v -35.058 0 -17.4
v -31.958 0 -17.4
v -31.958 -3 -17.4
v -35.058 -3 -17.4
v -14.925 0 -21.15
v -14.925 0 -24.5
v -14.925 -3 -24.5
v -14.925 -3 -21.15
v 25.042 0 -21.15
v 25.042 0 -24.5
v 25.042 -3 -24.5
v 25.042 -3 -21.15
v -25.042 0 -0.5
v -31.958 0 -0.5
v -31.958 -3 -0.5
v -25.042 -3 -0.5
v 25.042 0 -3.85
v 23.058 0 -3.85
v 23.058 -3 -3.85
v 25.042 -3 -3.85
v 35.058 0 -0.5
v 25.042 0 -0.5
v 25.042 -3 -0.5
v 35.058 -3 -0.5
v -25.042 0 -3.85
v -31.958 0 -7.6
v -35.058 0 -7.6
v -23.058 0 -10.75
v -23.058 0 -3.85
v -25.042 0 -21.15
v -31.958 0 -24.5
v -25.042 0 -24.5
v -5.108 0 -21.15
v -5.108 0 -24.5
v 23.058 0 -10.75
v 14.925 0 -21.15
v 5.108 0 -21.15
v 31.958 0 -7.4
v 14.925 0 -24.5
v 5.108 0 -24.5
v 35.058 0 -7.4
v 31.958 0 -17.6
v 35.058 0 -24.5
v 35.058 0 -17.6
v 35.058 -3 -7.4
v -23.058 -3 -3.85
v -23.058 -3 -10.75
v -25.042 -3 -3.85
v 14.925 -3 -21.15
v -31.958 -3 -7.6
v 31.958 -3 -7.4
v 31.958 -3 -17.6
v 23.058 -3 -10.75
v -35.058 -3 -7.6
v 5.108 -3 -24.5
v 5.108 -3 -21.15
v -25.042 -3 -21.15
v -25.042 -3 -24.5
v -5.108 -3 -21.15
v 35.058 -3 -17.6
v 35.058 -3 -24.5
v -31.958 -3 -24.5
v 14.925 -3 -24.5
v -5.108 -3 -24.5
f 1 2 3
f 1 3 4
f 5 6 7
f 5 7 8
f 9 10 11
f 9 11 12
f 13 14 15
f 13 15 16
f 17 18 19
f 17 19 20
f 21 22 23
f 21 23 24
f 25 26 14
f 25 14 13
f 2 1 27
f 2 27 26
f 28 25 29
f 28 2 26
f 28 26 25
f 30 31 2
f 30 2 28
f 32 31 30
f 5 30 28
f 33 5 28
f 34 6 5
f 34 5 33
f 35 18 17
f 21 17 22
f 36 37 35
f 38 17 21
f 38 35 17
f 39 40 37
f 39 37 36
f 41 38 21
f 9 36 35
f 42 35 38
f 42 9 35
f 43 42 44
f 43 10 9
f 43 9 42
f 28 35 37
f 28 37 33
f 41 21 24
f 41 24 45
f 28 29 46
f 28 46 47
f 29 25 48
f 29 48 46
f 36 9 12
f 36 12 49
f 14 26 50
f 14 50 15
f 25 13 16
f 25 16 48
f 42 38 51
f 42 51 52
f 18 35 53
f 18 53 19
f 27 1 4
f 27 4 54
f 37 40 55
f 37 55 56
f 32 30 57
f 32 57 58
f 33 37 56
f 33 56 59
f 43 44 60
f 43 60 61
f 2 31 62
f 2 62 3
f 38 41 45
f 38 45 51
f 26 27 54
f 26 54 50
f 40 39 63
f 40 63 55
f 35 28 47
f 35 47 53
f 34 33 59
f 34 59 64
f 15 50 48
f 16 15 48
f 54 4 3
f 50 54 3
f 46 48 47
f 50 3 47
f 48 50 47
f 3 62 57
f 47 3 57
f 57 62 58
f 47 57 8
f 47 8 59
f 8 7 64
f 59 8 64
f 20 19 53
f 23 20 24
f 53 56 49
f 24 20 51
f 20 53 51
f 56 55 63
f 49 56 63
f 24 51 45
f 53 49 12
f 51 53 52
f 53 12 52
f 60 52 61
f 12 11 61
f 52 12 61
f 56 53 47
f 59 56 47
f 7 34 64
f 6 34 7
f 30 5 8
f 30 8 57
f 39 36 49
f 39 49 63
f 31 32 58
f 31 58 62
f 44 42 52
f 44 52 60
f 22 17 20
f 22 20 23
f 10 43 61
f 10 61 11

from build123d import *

# Parameters (mm, degrees)
BOSS_EXTRUDE1_DEPTH = 3


with BuildPart() as part:
    # Sketch3 → Boss-Extrude1 (new body)
    with BuildSketch(Plane(origin=(0, 0, 0), x_dir=(1, 0, 0), z_dir=(0, 1, 0))):
        Polygon((-35.058452488, 17.4), (-35.058452488, 7.6), (-31.958452488, 7.6), (-31.958452488, 0.5), (-25.041751777, 0.5), (-25.041751777, 3.85), (-23.058452488, 3.85), (-23.058452488, 10.75), (23.058452488, 10.75), (23.058452488, 3.85), (25.041751777, 3.85), (25.041751777, 0.5), (35.058452488, 0.5), (35.058452488, 7.4), (31.958452488, 7.4), (31.958452488, 17.6), (35.058452488, 17.6), (35.058452488, 24.5), (25.041751777, 24.5), (25.041751777, 21.15), (14.925051066, 21.15), (14.925051066, 24.5), (5.108350355, 24.5), (5.108350355, 21.15), (-5.108350355, 21.15), (-5.108350355, 24.5), (-14.925051066, 24.5), (-14.925051066, 21.15), (-25.041751777, 21.15), (-25.041751777, 24.5), (-31.958452488, 24.5), (-31.958452488, 17.4), align=None)
    extrude(amount=-BOSS_EXTRUDE1_DEPTH)


solid = part.part
